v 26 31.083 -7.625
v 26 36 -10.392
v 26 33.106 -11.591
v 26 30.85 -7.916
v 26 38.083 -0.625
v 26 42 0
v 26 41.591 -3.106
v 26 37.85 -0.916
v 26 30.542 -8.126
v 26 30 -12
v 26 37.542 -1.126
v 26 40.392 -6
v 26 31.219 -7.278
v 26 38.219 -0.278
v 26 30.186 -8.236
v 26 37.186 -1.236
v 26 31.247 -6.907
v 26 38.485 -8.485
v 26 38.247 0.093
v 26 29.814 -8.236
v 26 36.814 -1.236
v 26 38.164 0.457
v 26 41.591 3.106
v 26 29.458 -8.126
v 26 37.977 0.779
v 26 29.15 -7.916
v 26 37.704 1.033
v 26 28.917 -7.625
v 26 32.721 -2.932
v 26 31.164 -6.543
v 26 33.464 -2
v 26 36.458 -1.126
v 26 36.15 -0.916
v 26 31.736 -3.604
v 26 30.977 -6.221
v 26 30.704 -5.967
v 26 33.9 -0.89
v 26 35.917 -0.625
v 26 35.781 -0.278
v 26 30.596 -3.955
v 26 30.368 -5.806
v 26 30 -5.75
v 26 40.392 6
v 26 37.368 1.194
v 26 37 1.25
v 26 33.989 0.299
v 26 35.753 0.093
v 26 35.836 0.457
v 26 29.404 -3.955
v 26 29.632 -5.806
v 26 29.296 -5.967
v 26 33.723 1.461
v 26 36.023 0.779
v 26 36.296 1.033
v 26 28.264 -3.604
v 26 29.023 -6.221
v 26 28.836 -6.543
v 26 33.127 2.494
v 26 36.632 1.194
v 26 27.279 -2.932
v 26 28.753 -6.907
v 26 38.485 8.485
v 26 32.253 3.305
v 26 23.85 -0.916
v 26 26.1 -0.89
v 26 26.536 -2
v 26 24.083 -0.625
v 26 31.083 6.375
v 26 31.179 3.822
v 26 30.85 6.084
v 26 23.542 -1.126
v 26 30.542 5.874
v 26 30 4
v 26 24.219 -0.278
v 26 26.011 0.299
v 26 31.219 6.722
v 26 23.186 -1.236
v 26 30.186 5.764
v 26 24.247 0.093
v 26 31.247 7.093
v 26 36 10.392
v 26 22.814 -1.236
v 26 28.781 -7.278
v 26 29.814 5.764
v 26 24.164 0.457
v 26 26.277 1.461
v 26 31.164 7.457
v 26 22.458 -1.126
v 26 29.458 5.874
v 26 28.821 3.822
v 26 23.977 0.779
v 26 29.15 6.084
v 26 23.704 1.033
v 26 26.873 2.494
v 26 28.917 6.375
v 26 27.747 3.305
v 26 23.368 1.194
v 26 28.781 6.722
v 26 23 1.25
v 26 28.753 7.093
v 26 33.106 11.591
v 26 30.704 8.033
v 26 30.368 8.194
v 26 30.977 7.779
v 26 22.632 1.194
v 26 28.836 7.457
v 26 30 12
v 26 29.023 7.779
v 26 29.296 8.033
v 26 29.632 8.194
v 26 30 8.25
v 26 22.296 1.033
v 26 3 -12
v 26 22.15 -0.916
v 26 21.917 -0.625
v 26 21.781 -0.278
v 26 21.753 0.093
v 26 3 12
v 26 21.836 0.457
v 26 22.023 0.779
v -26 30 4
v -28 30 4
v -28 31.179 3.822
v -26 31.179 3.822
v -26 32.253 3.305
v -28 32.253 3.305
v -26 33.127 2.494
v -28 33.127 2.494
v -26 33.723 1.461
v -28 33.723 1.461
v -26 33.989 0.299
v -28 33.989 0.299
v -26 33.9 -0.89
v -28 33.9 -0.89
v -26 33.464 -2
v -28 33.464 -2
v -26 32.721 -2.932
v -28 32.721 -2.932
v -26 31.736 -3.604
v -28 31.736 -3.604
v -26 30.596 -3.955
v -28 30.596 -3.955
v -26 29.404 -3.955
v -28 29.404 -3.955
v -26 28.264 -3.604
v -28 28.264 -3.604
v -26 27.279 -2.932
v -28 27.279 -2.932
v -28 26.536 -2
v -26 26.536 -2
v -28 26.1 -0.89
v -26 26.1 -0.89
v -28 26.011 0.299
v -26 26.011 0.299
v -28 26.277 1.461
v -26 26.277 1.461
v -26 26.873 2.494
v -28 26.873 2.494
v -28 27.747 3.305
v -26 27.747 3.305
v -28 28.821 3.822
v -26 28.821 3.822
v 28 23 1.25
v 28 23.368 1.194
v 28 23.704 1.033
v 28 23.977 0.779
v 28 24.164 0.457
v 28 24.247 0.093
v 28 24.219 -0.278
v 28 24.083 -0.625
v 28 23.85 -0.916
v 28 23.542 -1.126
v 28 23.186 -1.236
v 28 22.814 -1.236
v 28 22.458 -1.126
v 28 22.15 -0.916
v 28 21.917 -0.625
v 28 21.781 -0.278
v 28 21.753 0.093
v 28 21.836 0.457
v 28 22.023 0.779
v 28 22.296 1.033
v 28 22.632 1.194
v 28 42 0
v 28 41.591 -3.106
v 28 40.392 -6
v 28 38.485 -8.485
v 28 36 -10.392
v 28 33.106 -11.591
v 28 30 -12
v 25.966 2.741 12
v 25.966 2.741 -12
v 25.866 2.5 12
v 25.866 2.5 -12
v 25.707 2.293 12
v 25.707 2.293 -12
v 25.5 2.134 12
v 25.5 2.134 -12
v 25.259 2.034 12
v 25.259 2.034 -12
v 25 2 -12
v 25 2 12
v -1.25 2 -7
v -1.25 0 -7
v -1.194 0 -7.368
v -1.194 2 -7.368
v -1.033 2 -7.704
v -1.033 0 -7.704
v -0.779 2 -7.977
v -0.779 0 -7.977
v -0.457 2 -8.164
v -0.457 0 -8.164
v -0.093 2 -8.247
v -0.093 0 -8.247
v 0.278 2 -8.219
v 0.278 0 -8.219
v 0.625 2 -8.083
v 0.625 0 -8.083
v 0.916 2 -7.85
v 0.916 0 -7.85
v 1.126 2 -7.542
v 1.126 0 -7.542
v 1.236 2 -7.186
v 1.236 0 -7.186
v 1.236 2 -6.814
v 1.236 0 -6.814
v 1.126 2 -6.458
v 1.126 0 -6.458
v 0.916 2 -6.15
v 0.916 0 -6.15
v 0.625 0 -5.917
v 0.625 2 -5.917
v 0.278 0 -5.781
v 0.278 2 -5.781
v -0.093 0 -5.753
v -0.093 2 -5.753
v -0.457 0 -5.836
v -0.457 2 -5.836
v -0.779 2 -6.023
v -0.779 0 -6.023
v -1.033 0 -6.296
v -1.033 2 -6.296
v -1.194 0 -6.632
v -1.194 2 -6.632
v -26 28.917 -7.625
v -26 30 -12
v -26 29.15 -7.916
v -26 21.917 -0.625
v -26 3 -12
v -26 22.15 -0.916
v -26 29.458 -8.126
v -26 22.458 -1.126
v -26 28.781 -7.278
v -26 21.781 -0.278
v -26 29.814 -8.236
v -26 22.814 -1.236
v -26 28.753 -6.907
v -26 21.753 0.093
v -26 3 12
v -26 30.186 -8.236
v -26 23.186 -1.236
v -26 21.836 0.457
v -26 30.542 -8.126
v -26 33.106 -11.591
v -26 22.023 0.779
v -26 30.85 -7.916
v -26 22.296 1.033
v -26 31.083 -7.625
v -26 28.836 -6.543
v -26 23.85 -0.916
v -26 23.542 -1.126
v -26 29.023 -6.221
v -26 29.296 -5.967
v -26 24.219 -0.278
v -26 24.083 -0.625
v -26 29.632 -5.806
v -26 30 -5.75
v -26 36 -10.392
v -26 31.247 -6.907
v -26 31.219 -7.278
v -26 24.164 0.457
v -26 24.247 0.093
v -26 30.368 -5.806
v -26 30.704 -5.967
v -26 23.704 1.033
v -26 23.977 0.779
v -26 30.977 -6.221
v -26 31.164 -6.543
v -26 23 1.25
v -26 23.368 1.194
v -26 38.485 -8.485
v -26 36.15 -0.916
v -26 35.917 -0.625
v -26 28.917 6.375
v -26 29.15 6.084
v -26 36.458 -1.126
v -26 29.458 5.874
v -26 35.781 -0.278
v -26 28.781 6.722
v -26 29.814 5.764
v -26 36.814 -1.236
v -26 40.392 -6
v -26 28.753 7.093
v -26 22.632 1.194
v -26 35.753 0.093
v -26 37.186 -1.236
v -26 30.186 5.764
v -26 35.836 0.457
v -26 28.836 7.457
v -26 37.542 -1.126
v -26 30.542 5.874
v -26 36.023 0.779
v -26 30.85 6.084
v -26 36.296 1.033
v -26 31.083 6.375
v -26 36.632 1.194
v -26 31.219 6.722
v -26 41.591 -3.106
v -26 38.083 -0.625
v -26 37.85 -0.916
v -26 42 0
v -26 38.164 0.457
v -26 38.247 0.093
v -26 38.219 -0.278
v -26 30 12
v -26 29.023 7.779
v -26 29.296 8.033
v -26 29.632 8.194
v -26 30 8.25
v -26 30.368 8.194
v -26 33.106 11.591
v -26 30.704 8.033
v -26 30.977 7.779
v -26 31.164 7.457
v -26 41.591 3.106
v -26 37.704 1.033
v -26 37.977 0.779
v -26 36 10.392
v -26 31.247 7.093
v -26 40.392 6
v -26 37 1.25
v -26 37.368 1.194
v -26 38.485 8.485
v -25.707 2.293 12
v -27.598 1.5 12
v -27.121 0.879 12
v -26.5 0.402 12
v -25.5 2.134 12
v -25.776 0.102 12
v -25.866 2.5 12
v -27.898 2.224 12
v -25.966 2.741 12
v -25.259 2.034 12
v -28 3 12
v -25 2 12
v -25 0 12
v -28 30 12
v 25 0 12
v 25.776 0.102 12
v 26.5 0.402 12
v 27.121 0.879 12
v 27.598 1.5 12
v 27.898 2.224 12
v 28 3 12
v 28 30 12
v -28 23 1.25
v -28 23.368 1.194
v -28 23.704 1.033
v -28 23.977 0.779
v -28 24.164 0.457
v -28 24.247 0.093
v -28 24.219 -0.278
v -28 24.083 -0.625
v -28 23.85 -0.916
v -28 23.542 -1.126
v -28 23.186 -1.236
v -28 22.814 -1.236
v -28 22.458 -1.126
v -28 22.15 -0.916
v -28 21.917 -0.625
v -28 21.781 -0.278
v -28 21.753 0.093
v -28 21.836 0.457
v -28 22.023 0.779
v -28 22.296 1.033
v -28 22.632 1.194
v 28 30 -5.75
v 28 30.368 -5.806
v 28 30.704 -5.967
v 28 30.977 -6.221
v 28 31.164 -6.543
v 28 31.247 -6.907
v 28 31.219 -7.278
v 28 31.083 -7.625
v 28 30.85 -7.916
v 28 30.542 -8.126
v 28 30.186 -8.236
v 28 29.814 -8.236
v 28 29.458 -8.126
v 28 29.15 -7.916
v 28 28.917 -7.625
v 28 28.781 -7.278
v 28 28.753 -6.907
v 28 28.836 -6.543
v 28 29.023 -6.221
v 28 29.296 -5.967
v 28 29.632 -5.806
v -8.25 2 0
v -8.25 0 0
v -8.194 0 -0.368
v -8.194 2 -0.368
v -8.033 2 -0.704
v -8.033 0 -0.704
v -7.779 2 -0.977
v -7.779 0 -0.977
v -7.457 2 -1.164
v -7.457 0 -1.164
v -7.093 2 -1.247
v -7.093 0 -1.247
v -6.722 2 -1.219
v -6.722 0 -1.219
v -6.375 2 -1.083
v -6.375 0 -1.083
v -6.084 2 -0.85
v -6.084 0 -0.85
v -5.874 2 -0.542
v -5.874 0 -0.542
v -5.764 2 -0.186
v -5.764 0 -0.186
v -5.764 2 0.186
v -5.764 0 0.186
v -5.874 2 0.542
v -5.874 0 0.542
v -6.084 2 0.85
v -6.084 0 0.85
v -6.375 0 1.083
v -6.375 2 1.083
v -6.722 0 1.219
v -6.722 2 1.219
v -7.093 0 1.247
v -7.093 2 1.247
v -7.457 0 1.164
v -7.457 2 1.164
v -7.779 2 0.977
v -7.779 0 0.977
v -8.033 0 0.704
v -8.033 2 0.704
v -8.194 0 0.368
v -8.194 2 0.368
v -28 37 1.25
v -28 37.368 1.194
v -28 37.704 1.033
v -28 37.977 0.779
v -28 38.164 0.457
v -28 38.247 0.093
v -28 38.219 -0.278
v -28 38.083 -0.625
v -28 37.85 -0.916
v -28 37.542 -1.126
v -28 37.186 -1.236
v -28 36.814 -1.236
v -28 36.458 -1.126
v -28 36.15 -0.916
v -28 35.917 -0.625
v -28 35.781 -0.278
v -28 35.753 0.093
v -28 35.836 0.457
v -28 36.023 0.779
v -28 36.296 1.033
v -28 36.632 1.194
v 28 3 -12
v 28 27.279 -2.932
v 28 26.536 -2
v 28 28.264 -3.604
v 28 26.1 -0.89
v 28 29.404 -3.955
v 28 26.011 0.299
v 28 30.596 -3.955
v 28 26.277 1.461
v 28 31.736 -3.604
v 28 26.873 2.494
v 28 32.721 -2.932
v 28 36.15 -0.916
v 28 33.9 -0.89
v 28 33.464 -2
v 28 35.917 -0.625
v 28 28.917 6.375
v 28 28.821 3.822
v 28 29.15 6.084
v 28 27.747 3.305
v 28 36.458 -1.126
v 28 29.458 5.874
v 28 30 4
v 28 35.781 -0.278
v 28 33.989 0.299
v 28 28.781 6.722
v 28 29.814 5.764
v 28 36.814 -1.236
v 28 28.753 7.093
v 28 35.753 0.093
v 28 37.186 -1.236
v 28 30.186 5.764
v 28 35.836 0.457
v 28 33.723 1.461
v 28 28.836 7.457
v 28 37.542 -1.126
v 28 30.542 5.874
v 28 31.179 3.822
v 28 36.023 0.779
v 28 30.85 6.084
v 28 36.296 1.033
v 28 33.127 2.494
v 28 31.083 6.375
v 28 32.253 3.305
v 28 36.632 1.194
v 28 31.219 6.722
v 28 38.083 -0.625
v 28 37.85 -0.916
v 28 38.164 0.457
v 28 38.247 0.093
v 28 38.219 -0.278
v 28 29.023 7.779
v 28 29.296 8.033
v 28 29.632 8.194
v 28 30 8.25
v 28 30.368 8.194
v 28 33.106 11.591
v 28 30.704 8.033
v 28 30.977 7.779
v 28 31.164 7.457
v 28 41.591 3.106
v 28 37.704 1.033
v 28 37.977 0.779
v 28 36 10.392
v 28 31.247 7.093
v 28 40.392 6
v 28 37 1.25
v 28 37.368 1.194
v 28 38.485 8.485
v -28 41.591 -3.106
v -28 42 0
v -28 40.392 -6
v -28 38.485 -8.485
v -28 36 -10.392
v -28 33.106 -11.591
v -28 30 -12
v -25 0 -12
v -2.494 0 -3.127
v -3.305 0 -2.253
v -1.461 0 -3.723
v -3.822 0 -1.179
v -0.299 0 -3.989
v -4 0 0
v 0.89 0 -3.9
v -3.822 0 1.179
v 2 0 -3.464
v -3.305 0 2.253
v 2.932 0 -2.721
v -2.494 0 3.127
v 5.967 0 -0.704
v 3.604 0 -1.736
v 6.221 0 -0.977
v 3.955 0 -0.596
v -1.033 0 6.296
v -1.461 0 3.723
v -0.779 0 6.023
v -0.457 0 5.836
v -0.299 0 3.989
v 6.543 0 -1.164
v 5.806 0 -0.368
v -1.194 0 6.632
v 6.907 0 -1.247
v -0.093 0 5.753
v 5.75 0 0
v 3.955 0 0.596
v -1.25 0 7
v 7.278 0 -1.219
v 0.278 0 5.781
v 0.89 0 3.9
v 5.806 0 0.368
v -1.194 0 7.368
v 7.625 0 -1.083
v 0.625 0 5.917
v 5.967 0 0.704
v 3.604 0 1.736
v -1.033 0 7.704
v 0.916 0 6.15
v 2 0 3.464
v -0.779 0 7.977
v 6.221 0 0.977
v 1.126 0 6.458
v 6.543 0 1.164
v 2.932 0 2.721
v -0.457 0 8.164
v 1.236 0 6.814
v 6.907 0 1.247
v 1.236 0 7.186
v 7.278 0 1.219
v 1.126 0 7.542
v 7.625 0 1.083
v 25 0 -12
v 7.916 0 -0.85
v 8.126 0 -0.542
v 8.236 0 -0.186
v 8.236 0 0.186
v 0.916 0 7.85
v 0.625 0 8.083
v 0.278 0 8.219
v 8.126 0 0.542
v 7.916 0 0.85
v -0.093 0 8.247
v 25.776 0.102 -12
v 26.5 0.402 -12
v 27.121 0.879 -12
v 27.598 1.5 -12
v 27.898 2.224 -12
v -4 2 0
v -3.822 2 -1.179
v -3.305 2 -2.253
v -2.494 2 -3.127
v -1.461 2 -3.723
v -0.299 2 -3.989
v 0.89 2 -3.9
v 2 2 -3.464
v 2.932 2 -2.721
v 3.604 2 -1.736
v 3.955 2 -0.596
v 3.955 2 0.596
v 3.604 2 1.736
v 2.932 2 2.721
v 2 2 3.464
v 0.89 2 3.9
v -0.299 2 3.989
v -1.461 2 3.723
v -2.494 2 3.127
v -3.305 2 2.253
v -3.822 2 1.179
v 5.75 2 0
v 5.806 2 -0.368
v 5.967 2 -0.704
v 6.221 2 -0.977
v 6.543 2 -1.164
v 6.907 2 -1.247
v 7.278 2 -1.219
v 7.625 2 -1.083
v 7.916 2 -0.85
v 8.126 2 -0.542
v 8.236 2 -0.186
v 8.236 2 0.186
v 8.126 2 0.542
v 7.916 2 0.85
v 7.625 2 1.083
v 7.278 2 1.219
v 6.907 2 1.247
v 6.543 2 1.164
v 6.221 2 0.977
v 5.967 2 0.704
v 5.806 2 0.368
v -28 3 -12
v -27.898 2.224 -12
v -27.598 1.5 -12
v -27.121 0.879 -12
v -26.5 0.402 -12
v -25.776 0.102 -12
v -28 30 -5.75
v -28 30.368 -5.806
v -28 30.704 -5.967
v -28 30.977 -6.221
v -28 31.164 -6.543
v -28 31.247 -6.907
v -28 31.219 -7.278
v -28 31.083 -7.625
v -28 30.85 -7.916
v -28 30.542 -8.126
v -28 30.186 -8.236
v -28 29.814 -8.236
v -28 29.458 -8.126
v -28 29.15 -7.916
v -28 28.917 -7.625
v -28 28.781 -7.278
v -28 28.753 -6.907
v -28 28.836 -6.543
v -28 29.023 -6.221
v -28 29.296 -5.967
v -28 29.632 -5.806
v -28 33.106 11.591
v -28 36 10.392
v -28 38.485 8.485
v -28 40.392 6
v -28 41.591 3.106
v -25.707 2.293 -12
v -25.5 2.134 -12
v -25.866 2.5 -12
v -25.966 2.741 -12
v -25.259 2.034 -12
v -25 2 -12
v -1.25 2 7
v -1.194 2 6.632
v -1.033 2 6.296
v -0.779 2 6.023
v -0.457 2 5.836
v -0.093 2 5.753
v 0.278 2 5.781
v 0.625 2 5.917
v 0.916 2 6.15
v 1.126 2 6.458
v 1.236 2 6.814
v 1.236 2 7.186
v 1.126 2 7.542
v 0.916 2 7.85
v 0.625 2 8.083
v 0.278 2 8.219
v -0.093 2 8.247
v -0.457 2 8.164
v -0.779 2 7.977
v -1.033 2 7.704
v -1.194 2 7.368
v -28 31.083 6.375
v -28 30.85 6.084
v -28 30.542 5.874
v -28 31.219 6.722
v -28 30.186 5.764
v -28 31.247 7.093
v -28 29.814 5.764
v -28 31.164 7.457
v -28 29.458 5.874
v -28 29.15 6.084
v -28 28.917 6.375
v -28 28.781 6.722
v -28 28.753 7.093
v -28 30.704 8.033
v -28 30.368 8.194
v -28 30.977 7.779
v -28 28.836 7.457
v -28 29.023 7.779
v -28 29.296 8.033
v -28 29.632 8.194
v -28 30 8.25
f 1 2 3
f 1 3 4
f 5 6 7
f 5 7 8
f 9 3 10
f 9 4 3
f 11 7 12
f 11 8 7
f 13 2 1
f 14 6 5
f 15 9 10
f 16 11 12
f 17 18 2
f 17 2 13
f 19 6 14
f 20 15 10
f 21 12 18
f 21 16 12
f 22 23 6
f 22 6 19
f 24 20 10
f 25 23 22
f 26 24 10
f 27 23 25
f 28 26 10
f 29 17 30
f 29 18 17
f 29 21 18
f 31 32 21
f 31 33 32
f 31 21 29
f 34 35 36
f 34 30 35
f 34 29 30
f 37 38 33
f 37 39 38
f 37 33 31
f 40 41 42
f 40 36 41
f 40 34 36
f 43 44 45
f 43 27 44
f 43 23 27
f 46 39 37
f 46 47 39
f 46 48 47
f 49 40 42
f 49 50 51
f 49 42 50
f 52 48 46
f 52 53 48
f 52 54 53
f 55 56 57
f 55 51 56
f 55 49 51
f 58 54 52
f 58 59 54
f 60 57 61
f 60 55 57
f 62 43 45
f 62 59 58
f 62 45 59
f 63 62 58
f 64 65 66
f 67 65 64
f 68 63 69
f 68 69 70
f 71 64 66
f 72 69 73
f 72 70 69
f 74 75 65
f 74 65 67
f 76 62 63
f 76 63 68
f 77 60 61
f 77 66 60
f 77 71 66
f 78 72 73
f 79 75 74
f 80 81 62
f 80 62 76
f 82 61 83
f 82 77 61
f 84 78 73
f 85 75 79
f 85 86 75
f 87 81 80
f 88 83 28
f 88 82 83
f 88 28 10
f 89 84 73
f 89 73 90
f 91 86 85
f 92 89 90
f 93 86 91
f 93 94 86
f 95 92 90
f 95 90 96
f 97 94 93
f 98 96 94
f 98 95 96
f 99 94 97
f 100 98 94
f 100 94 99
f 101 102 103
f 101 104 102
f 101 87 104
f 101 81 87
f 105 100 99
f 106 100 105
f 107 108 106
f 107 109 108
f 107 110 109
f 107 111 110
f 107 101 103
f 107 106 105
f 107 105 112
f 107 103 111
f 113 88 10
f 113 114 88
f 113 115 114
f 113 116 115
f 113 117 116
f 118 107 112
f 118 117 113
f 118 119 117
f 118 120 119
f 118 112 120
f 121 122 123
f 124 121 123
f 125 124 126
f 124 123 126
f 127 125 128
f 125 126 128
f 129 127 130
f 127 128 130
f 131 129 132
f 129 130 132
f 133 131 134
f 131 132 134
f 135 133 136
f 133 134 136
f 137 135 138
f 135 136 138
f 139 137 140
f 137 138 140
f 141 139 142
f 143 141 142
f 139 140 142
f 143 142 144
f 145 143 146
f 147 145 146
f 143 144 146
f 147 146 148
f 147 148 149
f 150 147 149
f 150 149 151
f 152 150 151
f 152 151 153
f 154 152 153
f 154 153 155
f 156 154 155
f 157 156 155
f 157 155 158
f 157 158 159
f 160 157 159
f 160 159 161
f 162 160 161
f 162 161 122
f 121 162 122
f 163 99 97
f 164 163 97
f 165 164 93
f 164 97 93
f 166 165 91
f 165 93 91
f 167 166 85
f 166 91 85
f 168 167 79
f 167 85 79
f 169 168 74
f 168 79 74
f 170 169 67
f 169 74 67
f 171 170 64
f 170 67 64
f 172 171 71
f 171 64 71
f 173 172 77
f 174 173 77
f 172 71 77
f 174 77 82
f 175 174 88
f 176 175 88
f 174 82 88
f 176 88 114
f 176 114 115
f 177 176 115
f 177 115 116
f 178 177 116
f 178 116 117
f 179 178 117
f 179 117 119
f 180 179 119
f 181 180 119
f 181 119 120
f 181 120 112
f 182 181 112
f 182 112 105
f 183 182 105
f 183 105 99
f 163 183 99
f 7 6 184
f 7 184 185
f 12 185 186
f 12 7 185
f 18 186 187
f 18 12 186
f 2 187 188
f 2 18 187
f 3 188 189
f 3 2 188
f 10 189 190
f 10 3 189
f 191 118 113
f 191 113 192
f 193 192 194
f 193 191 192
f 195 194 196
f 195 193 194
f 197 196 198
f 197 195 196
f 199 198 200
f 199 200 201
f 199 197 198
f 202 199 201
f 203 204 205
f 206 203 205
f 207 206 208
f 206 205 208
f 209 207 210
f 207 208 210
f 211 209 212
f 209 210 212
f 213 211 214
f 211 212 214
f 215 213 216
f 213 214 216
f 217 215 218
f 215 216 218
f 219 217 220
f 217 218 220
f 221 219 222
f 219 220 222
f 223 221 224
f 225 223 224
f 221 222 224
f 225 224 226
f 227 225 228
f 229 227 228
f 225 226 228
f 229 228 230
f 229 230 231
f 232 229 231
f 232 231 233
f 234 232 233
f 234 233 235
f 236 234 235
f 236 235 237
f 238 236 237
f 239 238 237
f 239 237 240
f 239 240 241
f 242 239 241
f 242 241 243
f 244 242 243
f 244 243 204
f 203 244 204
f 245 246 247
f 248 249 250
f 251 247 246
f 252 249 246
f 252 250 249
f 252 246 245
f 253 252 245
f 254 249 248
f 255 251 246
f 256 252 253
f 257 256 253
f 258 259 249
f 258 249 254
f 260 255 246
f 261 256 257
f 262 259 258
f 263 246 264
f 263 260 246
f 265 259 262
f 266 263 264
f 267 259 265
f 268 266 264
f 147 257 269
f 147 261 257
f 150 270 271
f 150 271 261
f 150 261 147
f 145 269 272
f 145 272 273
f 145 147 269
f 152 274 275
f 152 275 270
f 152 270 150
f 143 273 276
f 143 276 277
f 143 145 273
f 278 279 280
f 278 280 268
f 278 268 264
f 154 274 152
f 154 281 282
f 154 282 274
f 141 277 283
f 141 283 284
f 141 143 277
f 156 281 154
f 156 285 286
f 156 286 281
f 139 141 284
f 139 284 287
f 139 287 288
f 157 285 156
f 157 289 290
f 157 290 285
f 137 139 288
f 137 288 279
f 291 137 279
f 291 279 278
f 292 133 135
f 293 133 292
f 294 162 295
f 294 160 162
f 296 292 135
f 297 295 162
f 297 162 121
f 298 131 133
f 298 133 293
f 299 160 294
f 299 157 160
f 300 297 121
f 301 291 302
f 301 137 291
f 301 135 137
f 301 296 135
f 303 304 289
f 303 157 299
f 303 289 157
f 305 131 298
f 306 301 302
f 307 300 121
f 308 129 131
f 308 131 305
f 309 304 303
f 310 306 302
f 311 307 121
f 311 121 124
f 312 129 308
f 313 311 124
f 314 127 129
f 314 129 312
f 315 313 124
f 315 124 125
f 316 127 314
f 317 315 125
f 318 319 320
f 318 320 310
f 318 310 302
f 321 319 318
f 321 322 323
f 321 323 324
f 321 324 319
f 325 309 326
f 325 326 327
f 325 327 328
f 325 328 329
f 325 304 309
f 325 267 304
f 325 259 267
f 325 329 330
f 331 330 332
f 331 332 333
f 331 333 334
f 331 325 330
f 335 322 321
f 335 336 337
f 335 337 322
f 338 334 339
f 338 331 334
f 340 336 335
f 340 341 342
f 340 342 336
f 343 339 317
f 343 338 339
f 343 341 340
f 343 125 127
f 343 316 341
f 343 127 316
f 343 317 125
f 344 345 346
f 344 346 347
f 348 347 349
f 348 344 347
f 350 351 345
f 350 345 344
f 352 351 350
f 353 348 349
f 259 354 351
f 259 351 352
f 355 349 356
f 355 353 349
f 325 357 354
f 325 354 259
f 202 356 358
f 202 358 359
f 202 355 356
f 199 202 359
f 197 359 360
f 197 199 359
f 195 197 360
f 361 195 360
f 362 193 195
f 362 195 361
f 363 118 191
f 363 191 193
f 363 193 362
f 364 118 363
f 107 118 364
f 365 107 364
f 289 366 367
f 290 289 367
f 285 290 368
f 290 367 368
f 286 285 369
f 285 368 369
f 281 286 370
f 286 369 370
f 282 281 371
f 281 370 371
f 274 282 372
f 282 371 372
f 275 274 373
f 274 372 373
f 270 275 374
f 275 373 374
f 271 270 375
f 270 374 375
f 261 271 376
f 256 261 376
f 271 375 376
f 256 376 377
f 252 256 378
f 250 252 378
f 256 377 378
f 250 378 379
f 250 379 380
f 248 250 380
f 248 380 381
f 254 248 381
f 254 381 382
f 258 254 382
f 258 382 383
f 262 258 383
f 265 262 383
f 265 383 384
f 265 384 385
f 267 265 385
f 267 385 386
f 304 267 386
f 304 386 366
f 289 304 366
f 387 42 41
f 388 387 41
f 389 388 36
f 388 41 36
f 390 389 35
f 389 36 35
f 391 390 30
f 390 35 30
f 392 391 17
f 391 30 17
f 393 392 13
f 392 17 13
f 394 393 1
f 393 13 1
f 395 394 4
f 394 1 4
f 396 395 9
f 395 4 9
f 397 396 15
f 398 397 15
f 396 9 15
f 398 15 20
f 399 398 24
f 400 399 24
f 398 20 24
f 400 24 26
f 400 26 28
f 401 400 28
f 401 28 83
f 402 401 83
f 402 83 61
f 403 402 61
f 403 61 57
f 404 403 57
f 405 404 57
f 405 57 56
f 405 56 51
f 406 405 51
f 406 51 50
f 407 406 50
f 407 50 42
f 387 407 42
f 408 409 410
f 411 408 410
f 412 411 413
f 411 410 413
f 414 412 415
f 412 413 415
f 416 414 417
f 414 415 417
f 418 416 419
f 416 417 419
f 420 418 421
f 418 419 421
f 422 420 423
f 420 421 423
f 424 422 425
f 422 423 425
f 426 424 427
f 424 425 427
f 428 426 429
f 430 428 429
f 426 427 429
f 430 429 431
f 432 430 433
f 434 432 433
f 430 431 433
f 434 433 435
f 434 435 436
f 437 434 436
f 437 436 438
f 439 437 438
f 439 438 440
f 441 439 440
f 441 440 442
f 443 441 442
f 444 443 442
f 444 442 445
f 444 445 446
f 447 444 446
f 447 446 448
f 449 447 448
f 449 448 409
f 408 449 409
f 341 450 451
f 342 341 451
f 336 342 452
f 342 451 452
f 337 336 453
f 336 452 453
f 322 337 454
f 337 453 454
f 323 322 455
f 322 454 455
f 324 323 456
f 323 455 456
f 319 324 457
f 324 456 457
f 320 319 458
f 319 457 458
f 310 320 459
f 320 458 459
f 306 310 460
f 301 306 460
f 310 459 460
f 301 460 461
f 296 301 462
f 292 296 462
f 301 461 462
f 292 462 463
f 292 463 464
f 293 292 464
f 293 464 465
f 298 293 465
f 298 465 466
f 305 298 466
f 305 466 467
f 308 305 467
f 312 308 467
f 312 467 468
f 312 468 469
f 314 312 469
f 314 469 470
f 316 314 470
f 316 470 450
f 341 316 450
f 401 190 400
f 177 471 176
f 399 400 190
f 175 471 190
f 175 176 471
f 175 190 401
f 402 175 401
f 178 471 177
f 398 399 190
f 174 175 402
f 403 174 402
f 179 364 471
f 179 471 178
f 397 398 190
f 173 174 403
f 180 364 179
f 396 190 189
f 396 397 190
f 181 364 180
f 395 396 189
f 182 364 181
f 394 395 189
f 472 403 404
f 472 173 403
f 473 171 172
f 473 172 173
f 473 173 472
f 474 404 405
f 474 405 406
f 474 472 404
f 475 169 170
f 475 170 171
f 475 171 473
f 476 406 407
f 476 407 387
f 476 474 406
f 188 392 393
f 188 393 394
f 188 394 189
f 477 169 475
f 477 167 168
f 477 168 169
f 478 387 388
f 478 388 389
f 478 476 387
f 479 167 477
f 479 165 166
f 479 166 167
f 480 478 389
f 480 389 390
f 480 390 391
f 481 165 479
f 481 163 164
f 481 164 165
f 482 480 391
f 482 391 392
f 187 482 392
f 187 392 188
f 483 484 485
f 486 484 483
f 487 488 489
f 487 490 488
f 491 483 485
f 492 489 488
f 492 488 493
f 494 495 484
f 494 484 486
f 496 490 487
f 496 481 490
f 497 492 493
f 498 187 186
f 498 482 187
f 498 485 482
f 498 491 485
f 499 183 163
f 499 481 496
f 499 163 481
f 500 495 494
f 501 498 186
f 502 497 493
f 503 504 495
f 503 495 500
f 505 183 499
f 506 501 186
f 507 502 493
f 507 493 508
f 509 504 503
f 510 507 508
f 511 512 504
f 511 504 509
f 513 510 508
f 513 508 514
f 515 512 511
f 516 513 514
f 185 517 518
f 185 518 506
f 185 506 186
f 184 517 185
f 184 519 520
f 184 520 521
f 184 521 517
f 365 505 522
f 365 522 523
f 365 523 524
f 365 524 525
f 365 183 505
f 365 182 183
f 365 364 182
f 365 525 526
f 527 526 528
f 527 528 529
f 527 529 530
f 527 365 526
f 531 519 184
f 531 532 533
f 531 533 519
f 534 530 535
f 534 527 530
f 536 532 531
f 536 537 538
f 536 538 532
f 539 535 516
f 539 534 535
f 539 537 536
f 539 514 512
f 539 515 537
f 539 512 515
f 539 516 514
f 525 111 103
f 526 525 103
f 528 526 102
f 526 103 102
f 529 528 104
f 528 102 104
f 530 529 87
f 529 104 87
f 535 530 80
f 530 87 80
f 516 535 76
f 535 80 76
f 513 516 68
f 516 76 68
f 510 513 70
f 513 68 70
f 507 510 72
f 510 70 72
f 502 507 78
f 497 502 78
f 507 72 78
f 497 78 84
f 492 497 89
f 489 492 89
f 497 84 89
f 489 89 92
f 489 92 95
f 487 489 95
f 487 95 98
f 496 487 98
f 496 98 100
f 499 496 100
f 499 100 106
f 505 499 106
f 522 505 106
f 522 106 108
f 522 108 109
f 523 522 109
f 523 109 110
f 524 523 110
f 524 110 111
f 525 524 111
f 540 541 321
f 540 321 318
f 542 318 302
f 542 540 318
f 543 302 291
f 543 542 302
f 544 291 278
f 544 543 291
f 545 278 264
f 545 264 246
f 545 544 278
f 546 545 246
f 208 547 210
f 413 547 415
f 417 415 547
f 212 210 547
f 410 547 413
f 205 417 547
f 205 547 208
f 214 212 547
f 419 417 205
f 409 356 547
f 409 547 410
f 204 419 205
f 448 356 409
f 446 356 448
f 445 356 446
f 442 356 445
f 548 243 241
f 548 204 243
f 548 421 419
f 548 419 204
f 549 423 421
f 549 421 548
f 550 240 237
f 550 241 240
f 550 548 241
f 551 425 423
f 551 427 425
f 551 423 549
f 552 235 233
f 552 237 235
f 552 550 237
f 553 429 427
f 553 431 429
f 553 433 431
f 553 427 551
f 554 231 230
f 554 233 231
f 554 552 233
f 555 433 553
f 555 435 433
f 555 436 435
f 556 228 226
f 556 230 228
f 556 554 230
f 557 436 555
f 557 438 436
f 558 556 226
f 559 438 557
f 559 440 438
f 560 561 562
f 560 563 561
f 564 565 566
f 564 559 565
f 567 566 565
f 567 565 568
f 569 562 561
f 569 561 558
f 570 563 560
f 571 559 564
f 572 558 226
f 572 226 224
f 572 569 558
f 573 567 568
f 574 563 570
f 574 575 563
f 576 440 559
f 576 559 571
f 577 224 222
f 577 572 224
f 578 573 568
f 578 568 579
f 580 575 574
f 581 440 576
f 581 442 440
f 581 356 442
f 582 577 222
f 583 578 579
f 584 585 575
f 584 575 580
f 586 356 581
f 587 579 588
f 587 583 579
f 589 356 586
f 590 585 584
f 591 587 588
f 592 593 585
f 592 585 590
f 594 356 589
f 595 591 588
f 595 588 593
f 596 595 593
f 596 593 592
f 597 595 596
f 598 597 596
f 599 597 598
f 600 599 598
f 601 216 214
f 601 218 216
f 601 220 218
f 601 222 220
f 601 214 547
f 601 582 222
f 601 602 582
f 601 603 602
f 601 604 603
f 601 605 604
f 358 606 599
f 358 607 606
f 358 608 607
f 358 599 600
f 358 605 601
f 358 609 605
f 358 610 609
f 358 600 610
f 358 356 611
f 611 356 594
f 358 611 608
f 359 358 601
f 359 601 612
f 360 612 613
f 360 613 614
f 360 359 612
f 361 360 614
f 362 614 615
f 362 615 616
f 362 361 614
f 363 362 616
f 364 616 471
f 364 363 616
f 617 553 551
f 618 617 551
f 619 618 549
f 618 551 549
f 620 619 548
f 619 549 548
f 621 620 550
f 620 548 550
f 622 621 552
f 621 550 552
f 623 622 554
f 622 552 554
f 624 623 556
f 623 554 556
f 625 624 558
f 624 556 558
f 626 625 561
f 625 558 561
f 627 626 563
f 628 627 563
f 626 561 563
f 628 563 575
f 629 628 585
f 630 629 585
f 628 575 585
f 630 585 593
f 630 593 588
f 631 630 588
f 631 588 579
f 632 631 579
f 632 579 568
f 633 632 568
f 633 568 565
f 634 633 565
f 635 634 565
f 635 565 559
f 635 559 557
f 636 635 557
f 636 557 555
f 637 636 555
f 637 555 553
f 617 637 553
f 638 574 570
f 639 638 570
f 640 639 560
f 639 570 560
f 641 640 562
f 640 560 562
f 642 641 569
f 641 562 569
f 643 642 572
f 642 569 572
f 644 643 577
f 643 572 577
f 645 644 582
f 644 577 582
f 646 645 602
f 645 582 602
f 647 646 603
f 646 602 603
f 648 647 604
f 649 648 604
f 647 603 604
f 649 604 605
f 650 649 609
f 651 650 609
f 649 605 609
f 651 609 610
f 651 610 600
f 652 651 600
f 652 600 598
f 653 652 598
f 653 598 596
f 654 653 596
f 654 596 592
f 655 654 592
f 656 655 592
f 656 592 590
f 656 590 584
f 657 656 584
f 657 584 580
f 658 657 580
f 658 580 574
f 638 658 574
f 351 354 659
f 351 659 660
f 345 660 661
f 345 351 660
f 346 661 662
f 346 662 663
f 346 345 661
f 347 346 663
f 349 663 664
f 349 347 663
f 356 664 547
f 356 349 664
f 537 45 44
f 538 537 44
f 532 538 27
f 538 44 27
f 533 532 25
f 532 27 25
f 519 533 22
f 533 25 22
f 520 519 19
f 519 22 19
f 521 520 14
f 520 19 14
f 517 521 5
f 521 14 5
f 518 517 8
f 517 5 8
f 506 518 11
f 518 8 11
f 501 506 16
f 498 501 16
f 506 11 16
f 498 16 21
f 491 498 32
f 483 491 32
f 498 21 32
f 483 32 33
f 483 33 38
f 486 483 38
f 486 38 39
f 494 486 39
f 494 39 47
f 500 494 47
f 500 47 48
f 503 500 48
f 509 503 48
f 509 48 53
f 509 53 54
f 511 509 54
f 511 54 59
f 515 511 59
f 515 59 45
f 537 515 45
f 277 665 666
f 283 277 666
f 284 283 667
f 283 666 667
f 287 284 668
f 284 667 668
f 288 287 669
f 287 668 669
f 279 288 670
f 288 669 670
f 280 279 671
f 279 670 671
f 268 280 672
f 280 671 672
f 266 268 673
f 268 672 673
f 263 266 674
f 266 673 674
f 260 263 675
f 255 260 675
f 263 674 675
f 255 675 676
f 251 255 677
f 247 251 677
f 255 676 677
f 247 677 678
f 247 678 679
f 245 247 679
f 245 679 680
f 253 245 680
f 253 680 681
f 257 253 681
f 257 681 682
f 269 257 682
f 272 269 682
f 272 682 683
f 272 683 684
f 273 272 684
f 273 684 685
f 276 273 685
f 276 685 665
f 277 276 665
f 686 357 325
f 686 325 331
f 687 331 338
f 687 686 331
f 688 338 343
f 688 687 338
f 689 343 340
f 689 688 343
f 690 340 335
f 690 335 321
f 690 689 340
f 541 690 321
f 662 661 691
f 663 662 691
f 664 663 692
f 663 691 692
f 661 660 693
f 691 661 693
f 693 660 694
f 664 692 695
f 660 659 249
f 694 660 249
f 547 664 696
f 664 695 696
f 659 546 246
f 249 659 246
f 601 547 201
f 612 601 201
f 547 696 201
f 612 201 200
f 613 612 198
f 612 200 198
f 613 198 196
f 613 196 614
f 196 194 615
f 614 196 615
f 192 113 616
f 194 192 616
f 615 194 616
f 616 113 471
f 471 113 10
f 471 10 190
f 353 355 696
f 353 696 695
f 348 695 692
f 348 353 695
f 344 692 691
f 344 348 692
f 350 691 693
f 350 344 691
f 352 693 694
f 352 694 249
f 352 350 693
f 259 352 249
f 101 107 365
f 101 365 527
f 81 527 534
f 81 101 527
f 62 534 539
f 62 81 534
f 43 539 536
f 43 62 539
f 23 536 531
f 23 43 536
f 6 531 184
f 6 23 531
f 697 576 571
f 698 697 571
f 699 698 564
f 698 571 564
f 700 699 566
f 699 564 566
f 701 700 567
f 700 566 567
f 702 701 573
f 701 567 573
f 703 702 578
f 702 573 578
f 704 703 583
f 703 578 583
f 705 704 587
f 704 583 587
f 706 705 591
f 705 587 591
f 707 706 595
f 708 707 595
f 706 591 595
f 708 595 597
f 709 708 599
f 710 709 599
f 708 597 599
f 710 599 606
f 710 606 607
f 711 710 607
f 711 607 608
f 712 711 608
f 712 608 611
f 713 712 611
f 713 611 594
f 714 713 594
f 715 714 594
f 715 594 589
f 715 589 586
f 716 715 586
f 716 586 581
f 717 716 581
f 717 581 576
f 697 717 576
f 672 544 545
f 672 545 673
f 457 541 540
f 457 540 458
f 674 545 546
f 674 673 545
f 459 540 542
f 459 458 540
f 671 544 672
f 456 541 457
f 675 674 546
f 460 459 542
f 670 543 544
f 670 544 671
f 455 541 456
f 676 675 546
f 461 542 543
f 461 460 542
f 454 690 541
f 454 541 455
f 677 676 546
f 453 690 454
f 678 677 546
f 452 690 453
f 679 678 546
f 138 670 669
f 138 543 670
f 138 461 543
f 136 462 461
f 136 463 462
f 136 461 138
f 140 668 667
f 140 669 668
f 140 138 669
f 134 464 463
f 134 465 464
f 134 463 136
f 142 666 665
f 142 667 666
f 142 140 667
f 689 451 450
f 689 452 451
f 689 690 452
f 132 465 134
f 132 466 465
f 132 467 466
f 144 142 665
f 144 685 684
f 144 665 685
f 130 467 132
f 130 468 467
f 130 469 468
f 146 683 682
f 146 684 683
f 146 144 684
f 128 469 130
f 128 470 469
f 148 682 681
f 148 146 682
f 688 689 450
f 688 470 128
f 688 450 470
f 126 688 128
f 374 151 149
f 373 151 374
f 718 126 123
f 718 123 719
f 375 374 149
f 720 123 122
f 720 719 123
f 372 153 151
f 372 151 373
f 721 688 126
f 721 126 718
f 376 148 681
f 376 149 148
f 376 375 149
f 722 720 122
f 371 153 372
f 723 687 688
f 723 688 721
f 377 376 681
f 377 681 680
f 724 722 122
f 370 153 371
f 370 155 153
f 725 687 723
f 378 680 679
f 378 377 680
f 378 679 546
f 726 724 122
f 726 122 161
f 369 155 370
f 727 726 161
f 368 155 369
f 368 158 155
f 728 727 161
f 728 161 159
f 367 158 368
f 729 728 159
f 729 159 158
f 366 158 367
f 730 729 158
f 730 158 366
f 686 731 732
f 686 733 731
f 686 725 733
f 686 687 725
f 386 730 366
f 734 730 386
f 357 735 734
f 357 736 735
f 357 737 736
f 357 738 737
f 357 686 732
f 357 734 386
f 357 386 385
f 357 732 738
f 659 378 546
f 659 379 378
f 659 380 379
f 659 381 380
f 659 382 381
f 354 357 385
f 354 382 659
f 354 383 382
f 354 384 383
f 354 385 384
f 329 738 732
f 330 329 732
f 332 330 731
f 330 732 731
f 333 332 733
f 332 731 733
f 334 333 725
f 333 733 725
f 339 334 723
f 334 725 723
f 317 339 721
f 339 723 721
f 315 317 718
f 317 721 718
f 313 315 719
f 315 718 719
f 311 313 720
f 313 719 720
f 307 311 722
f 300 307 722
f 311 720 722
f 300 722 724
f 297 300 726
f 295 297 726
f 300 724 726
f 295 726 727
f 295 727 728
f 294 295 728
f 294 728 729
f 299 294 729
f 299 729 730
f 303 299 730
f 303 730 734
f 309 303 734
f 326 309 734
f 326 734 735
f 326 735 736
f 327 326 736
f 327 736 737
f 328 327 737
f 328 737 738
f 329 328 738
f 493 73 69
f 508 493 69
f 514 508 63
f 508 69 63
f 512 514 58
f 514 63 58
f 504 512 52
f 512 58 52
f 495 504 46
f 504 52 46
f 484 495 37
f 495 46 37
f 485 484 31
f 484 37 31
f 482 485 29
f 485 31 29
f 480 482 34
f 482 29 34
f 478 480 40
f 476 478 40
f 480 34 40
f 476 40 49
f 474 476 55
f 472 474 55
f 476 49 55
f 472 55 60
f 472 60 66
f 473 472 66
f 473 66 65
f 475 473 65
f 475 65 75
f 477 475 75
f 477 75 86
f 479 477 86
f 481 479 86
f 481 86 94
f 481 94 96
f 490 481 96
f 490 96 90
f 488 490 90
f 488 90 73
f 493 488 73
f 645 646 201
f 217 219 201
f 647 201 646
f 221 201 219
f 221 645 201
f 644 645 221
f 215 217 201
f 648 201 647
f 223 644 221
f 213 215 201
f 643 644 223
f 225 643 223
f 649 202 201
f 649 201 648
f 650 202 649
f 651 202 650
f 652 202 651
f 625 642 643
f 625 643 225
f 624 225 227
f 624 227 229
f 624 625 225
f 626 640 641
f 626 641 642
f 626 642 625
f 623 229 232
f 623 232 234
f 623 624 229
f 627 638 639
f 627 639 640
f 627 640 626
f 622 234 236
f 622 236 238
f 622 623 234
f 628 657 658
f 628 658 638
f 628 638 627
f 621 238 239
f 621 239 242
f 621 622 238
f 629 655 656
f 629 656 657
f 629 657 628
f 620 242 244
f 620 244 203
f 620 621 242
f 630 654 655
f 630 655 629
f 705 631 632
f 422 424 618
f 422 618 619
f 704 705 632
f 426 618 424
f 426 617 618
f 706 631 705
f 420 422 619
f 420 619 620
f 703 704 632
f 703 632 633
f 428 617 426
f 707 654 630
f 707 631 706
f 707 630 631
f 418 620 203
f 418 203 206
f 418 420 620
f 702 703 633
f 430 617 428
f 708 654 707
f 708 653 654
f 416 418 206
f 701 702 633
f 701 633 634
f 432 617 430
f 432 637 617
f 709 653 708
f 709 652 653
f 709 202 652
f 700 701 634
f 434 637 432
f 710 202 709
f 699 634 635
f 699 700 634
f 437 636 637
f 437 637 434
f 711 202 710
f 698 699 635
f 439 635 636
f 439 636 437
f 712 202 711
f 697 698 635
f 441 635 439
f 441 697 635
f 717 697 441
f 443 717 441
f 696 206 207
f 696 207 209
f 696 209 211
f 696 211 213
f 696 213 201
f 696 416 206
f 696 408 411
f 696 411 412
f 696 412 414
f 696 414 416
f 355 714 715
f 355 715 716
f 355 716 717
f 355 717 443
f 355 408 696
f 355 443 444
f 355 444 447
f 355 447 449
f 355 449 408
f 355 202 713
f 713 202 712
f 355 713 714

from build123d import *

# Parameters (mm, degrees)
T_LE_DE_BASE_PLI_E1_DEPTH       = 12
ENL_V_START                     = -56
ENL_V_MAT_EXTRU_1_DEPTH         = 56
DIAM_TRE_DU_PER_AGE_8_0_8_1_D   = 8
DIAM_TRE_DU_PER_AGE_2_5_2_5_1_D = 2.5
DIAM_TRE_DU_PER_AGE_8_0_8_2_D   = 8
DIAM_TRE_DU_PER_AGE_2_5_2_5_2_D = 2.5


# Read off the part's stored shape, not the designer's step: Enlèv. mat.-Extru.1
# Sheet-metal steps are written as plain solids
with BuildPart() as part:
    # Esquisse1 → Tôle de base pliée1 (new, symmetric)
    with BuildSketch(Plane.XY):
        with BuildLine():
            Line((-28, 42), (-28, 3))
            ThreePointArc((-28, 3), (-27.121320344, 0.878679656), (-25, 0))
            Line((-25, 0), (25, 0))
            ThreePointArc((25, 0), (27.121320344, 0.878679656), (28, 3))
            Line((28, 3), (28, 42))
            Line((28, 42), (26, 42))
            Line((26, 42), (26, 3))
            ThreePointArc((26, 3), (25.707106781, 2.292893219), (25, 2))
            Line((25, 2), (-25, 2))
            ThreePointArc((-25, 2), (-25.707106781, 2.292893219), (-26, 3))
            Line((-26, 3), (-26, 42))
            Line((-26, 42), (-28, 42))
        make_face()
    extrude(amount=T_LE_DE_BASE_PLI_E1_DEPTH, both=True)

    # Enlèv. mat.-Extru.1 outline → Enlèv. mat.-Extru.1 (cut)
    with BuildSketch(Plane(origin=(28, 0, 0), x_dir=(0, 0, -1), z_dir=(1, 0, 0)).offset(ENL_V_START)):
        with BuildLine():
            ThreePointArc((-12, 30), (-8.485281374, 38.485281374), (0, 42))
            Line((0, 42), (-12, 42))
            Line((-12, 42), (-12, 30))
        make_face()
        with BuildLine():
            ThreePointArc((0, 42), (8.485281374, 38.485281374), (12, 30))
            Line((12, 30), (12, 42))
            Line((12, 42), (0, 42))
        make_face()
    extrude(amount=ENL_V_MAT_EXTRU_1_DEPTH, mode=Mode.SUBTRACT)

    # Diamètre du perçage Ø8.0 (8)1 (through all)
    with Locations(Plane(origin=(28, 0, 0), x_dir=(0, 0, -1), z_dir=(1, 0, 0))):
        with Locations((0, 30)):
            Hole(DIAM_TRE_DU_PER_AGE_8_0_8_1_D / 2)

    # Diamètre du perçage Ø2.5 (2.5)1 (through all)
    with Locations(Plane(origin=(28, 0, 0), x_dir=(0, 0, -1), z_dir=(1, 0, 0))):
        with Locations((0, 37), (7, 30), (0, 23), (-7, 30)):
            Hole(DIAM_TRE_DU_PER_AGE_2_5_2_5_1_D / 2)

    # Diamètre du perçage Ø8.0 (8)2 (through all)
    with Locations(Plane(origin=(0, 2, 0), x_dir=(1, 0, 0), z_dir=(0, 1, 0))):
        with Locations((0, 0)):
            Hole(DIAM_TRE_DU_PER_AGE_8_0_8_2_D / 2)

    # Diamètre du perçage Ø2.5 (2.5)2 (through all)
    with Locations(Plane(origin=(0, 2, 0), x_dir=(1, 0, 0), z_dir=(0, 1, 0))):
        with Locations((0, 7), (7, 0), (0, -7), (-7, 0)):
            Hole(DIAM_TRE_DU_PER_AGE_2_5_2_5_2_D / 2)


solid = part.part
